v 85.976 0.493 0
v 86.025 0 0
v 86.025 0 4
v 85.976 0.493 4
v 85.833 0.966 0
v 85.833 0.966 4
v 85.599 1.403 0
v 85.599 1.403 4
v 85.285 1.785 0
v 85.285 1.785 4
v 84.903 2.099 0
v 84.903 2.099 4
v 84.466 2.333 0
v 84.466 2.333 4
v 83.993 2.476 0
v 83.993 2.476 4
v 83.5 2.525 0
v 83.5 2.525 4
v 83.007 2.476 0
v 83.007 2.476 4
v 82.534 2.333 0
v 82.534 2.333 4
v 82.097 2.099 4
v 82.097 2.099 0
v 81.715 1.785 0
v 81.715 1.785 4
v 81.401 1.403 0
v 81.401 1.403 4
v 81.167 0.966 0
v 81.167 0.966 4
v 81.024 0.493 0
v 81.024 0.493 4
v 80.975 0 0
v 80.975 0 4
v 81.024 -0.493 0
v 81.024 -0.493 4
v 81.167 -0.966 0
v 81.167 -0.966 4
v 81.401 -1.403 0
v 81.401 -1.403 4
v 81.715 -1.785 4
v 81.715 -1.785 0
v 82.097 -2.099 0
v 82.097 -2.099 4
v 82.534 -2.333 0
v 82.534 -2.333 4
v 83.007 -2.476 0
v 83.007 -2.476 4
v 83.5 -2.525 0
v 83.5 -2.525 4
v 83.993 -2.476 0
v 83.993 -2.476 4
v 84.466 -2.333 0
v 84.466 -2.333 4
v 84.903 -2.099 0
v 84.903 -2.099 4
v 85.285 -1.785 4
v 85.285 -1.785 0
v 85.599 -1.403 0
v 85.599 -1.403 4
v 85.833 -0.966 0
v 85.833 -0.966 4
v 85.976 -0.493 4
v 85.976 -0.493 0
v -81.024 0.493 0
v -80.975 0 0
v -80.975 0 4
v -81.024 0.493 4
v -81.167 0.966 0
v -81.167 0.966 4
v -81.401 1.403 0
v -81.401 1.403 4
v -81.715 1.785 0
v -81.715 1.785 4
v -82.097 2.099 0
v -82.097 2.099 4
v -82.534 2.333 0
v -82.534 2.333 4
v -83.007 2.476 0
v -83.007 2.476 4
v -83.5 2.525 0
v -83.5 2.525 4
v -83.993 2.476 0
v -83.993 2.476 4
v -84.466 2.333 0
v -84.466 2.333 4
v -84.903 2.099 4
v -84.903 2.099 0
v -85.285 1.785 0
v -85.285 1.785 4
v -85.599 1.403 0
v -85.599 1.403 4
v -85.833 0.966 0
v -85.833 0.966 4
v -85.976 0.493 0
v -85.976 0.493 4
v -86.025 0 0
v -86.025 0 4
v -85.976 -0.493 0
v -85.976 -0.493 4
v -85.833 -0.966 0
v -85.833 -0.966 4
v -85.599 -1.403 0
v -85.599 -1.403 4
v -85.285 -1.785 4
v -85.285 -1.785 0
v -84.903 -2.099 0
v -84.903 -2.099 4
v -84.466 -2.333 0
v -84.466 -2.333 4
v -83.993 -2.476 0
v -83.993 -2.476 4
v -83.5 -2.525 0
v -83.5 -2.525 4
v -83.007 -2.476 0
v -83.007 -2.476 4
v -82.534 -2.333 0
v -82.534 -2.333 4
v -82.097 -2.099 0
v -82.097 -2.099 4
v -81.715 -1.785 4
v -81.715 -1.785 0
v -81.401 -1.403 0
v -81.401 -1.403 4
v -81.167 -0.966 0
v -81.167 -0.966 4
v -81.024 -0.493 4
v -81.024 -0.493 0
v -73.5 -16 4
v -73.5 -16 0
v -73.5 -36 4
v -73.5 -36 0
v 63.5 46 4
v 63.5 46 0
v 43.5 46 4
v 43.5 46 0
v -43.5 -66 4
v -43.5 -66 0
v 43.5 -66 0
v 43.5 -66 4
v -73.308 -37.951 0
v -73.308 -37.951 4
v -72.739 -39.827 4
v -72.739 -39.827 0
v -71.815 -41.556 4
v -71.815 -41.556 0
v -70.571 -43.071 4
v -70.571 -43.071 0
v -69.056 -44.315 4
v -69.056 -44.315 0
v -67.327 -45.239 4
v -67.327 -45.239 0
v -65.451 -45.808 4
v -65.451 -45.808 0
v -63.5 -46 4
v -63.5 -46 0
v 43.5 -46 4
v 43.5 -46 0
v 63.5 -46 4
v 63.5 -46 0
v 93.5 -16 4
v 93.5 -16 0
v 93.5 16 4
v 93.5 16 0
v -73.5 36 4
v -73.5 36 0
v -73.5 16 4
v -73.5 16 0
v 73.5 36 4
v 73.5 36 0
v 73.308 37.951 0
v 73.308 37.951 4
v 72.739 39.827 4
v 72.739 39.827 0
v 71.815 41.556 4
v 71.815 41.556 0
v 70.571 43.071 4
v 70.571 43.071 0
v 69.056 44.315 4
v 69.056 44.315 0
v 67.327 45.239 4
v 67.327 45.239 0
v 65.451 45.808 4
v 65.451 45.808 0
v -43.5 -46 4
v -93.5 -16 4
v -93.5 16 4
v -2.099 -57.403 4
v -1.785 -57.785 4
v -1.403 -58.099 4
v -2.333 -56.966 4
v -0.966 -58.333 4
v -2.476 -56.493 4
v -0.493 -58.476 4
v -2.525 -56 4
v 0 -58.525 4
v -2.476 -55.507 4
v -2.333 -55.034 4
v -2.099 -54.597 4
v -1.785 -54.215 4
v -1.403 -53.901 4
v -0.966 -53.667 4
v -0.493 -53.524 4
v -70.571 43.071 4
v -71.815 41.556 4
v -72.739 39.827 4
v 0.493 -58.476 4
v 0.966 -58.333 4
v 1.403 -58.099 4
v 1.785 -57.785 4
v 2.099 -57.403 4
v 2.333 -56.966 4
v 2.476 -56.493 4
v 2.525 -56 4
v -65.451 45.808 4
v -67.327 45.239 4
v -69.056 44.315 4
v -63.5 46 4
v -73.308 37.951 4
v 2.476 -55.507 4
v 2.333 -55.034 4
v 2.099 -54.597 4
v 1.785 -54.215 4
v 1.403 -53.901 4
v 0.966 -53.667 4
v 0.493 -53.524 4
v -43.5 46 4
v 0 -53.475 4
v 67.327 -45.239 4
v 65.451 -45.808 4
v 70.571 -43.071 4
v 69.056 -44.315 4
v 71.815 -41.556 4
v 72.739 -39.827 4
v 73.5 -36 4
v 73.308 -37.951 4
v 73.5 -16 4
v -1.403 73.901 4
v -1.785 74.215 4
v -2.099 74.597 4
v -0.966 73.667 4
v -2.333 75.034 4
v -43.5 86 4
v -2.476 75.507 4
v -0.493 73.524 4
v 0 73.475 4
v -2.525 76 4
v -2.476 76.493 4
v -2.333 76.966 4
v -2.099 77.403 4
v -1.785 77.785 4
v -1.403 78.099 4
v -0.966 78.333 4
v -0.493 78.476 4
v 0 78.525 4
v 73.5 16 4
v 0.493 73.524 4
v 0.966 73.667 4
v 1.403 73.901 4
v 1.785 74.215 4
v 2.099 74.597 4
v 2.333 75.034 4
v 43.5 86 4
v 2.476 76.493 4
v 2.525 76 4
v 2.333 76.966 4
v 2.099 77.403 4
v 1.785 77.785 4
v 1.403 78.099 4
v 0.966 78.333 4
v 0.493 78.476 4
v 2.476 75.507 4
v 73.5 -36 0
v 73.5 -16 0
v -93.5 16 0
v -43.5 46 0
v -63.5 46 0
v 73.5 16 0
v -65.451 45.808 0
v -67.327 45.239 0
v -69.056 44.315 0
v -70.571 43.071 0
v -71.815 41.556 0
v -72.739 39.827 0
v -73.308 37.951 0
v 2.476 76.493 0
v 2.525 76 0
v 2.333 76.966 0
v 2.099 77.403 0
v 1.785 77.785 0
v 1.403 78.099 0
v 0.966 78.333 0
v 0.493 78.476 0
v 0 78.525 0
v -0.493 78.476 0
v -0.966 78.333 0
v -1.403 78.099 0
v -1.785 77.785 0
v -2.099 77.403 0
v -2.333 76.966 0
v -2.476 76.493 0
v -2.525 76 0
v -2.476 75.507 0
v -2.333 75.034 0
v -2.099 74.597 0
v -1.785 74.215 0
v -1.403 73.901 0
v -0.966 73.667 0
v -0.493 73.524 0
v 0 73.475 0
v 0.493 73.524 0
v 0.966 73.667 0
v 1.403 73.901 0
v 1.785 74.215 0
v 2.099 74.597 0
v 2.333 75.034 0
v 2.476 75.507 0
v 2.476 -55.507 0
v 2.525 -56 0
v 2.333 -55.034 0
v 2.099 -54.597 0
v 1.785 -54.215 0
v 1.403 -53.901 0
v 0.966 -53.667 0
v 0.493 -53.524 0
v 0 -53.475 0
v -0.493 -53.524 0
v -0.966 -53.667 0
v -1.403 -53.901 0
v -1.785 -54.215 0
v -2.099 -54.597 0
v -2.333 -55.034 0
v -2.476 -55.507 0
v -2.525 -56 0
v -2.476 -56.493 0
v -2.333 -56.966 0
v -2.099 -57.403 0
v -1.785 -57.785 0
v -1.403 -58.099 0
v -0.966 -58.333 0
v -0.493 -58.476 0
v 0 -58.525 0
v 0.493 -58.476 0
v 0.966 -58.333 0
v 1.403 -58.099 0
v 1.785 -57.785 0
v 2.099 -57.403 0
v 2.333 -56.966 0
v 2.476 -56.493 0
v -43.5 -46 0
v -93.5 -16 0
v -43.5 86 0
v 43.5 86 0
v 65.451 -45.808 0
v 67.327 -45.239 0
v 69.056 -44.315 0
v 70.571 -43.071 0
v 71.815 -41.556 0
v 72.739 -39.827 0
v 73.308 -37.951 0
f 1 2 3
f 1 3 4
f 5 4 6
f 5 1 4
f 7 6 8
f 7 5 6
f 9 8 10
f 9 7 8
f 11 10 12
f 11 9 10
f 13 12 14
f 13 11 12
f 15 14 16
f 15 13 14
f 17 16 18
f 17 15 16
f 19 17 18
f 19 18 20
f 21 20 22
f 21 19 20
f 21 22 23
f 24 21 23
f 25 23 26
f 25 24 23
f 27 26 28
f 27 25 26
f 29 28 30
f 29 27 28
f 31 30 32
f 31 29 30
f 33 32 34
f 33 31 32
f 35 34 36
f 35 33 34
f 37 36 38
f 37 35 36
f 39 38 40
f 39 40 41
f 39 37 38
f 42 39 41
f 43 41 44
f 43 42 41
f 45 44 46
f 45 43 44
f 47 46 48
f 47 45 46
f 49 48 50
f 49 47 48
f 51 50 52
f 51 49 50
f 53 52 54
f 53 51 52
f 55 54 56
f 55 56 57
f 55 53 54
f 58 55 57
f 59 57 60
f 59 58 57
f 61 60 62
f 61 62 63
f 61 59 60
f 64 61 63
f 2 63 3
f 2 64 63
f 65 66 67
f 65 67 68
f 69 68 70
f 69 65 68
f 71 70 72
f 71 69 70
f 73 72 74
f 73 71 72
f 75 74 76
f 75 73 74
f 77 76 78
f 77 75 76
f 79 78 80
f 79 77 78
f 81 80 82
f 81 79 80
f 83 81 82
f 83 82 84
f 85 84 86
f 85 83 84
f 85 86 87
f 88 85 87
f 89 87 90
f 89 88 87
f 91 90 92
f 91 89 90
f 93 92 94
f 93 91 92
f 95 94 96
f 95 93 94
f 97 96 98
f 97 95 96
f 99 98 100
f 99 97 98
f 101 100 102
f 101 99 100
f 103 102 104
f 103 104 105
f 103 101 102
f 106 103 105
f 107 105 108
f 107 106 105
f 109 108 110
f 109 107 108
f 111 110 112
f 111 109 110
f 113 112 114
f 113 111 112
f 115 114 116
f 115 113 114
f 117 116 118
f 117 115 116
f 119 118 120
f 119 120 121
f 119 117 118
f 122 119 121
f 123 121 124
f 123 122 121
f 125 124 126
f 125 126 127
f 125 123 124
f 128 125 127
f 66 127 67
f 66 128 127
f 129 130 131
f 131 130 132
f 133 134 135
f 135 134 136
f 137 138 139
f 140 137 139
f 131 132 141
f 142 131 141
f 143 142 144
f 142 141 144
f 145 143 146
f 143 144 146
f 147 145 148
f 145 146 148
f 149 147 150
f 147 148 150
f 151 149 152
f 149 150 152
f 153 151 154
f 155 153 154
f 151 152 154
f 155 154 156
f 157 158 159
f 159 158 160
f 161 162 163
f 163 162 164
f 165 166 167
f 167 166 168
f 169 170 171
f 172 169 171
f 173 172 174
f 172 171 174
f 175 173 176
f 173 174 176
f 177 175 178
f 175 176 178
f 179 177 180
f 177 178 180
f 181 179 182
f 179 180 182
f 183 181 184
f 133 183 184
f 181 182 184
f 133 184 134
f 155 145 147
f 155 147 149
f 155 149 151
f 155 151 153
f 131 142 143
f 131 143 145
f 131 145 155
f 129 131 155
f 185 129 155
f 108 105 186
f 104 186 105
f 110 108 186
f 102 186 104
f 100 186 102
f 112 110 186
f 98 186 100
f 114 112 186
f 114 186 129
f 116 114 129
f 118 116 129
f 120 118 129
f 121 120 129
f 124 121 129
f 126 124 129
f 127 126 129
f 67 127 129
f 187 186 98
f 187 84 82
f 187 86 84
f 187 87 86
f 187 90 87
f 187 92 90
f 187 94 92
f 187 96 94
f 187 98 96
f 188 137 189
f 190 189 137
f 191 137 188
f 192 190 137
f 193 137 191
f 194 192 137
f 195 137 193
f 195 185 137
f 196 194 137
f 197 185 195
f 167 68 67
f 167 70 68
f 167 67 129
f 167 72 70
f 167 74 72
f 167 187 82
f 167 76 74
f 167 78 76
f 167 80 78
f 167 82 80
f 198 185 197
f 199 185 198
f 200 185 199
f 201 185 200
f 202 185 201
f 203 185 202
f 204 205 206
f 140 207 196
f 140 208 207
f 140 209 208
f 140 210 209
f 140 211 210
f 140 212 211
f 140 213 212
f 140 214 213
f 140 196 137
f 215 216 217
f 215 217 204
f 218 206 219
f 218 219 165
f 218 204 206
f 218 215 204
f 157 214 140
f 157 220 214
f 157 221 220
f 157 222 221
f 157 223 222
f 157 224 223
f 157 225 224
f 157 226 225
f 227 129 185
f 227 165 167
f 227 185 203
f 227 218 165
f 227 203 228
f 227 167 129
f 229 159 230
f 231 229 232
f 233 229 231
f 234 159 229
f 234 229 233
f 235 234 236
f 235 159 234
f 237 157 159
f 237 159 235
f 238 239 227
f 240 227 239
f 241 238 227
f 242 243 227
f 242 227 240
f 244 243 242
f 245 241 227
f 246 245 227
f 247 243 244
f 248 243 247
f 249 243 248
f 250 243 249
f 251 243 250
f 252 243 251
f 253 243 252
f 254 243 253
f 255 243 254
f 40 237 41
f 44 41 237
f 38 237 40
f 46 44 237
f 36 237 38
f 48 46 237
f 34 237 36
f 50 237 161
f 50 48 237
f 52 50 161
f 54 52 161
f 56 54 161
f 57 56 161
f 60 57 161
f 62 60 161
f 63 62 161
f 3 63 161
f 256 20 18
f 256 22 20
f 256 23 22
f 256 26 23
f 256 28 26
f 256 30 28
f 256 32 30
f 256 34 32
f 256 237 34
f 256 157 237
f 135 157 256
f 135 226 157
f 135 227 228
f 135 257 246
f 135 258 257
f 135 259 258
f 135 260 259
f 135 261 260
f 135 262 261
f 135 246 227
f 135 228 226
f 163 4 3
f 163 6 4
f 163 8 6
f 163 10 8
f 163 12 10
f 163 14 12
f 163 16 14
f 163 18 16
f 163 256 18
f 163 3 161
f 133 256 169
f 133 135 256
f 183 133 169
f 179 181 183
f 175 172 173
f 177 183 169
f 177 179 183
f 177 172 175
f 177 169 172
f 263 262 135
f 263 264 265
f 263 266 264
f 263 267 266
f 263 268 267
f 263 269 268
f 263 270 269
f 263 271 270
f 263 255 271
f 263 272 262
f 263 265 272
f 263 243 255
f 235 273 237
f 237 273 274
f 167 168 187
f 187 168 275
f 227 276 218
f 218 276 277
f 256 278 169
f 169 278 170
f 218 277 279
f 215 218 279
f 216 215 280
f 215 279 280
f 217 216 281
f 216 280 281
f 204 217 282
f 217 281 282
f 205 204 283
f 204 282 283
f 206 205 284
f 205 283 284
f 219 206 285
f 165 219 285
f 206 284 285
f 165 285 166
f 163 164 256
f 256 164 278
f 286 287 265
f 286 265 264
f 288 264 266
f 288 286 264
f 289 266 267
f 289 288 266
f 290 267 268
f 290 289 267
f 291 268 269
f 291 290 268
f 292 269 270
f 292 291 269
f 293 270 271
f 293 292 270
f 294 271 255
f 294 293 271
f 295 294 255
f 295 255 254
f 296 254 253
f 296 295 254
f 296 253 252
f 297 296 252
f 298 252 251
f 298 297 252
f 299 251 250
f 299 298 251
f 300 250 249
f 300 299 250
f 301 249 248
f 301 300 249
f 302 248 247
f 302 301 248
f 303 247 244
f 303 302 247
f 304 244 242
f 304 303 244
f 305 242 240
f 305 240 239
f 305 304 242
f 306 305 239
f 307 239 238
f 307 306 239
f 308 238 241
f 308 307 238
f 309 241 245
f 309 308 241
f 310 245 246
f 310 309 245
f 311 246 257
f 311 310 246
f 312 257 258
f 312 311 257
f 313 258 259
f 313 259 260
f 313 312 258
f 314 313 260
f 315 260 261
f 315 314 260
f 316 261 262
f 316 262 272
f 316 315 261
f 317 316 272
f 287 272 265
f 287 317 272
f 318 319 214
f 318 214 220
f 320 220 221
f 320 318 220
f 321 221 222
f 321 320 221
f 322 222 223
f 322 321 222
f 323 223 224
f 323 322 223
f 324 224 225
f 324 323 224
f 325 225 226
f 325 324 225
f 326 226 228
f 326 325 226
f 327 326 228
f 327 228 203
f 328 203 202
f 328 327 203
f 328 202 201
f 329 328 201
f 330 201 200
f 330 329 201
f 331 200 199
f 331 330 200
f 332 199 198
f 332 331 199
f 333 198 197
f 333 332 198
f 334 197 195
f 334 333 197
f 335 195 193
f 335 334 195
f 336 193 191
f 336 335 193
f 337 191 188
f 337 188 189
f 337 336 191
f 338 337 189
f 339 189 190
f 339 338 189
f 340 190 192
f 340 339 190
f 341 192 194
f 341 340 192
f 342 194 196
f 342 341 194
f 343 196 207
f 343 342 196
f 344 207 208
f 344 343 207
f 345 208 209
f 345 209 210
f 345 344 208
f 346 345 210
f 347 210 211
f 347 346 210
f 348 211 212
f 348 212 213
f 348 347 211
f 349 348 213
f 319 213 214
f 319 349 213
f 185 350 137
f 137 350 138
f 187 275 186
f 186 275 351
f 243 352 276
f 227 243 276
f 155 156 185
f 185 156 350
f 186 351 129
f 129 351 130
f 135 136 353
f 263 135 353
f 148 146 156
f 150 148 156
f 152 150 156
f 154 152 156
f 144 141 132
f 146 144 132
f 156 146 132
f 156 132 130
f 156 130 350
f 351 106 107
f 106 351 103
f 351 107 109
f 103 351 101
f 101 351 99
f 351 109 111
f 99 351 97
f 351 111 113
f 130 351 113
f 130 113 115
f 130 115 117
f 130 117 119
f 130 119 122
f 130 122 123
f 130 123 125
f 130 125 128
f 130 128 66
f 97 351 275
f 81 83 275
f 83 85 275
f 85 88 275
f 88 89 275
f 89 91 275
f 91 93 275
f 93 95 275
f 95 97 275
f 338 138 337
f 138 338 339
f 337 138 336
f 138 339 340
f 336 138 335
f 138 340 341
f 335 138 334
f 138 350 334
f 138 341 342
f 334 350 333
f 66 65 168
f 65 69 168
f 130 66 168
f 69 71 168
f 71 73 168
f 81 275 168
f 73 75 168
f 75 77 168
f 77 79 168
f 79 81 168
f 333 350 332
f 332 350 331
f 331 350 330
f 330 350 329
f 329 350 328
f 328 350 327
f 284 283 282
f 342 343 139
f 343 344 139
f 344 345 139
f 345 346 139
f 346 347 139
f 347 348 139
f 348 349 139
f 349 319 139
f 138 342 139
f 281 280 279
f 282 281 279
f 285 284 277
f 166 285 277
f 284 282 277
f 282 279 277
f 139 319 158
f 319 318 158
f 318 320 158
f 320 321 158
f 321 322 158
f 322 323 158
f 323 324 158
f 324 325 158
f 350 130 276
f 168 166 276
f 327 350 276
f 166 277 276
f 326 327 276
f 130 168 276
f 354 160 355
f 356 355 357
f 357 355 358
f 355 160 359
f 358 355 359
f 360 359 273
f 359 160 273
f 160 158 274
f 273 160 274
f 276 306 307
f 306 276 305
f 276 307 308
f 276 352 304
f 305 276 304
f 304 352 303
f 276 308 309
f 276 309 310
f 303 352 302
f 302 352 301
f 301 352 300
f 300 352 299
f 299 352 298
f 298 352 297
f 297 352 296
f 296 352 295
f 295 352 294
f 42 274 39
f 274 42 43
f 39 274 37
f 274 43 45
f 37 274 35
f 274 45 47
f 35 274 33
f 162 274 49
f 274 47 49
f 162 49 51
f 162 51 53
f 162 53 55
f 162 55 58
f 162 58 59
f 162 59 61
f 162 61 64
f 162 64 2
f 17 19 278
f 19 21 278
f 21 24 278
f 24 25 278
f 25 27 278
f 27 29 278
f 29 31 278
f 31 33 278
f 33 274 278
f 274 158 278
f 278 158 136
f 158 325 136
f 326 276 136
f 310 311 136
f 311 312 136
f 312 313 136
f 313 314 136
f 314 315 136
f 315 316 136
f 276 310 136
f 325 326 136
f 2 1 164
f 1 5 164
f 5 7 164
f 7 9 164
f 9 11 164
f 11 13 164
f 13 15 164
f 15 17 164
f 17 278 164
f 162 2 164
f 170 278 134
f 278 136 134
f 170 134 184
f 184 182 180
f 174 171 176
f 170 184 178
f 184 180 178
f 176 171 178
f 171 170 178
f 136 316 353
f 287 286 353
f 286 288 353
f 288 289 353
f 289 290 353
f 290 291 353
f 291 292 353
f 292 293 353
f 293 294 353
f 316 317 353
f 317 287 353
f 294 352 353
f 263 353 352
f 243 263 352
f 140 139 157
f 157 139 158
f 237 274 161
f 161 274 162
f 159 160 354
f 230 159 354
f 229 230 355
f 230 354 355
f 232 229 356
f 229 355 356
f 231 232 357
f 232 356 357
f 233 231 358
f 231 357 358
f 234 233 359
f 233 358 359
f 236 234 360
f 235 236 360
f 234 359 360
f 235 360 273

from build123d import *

# Parameters (mm, degrees)
SKETCH1_R           = 2.525
BOSS_EXTRUDE1_DEPTH = 4


with BuildPart() as part:
    # Sketch1 → Boss-Extrude1 (new body)
    with BuildSketch(Plane.XY):
        with BuildLine():
            Line((-43.5, 86), (-43.5, 46))
            Line((-43.5, 46), (-63.5, 46))
            ThreePointArc((-63.5, 46), (-70.571067812, 43.071067812), (-73.5, 36))
            Line((-73.5, 36), (-73.5, 16))
            Line((-73.5, 16), (-93.5, 16))
            Line((-93.5, 16), (-93.5, -16))
            Line((-93.5, -16), (-73.5, -16))
            Line((-73.5, -16), (-73.5, -36))
            ThreePointArc((-73.5, -36), (-70.571067812, -43.071067812), (-63.5, -46))
            Line((-63.5, -46), (-43.5, -46))
            Line((-43.5, -46), (-43.5, -66))
            Line((-43.5, -66), (43.5, -66))
            Line((43.5, -66), (43.5, -46))
            Line((43.5, -46), (63.5, -46))
            ThreePointArc((63.5, -46), (70.571067812, -43.071067812), (73.5, -36))
            Line((73.5, -36), (73.5, -16))
            Line((73.5, -16), (93.5, -16))
            Line((93.5, -16), (93.5, 16))
            Line((93.5, 16), (73.5, 16))
            Line((73.5, 16), (73.5, 36))
            ThreePointArc((73.5, 36), (70.571067812, 43.071067812), (63.5, 46))
            Line((63.5, 46), (43.5, 46))
            Line((43.5, 46), (43.5, 86))
            Line((43.5, 86), (-43.5, 86))
        make_face()
        with Locations((0, 76)):
            Circle(SKETCH1_R, mode=Mode.SUBTRACT)
        with Locations((-83.5, 0)):
            Circle(SKETCH1_R, mode=Mode.SUBTRACT)
        with Locations((83.5, 0)):
            Circle(SKETCH1_R, mode=Mode.SUBTRACT)
        with Locations((0, -56)):
            Circle(SKETCH1_R, mode=Mode.SUBTRACT)
    extrude(amount=BOSS_EXTRUDE1_DEPTH)


solid = part.part
